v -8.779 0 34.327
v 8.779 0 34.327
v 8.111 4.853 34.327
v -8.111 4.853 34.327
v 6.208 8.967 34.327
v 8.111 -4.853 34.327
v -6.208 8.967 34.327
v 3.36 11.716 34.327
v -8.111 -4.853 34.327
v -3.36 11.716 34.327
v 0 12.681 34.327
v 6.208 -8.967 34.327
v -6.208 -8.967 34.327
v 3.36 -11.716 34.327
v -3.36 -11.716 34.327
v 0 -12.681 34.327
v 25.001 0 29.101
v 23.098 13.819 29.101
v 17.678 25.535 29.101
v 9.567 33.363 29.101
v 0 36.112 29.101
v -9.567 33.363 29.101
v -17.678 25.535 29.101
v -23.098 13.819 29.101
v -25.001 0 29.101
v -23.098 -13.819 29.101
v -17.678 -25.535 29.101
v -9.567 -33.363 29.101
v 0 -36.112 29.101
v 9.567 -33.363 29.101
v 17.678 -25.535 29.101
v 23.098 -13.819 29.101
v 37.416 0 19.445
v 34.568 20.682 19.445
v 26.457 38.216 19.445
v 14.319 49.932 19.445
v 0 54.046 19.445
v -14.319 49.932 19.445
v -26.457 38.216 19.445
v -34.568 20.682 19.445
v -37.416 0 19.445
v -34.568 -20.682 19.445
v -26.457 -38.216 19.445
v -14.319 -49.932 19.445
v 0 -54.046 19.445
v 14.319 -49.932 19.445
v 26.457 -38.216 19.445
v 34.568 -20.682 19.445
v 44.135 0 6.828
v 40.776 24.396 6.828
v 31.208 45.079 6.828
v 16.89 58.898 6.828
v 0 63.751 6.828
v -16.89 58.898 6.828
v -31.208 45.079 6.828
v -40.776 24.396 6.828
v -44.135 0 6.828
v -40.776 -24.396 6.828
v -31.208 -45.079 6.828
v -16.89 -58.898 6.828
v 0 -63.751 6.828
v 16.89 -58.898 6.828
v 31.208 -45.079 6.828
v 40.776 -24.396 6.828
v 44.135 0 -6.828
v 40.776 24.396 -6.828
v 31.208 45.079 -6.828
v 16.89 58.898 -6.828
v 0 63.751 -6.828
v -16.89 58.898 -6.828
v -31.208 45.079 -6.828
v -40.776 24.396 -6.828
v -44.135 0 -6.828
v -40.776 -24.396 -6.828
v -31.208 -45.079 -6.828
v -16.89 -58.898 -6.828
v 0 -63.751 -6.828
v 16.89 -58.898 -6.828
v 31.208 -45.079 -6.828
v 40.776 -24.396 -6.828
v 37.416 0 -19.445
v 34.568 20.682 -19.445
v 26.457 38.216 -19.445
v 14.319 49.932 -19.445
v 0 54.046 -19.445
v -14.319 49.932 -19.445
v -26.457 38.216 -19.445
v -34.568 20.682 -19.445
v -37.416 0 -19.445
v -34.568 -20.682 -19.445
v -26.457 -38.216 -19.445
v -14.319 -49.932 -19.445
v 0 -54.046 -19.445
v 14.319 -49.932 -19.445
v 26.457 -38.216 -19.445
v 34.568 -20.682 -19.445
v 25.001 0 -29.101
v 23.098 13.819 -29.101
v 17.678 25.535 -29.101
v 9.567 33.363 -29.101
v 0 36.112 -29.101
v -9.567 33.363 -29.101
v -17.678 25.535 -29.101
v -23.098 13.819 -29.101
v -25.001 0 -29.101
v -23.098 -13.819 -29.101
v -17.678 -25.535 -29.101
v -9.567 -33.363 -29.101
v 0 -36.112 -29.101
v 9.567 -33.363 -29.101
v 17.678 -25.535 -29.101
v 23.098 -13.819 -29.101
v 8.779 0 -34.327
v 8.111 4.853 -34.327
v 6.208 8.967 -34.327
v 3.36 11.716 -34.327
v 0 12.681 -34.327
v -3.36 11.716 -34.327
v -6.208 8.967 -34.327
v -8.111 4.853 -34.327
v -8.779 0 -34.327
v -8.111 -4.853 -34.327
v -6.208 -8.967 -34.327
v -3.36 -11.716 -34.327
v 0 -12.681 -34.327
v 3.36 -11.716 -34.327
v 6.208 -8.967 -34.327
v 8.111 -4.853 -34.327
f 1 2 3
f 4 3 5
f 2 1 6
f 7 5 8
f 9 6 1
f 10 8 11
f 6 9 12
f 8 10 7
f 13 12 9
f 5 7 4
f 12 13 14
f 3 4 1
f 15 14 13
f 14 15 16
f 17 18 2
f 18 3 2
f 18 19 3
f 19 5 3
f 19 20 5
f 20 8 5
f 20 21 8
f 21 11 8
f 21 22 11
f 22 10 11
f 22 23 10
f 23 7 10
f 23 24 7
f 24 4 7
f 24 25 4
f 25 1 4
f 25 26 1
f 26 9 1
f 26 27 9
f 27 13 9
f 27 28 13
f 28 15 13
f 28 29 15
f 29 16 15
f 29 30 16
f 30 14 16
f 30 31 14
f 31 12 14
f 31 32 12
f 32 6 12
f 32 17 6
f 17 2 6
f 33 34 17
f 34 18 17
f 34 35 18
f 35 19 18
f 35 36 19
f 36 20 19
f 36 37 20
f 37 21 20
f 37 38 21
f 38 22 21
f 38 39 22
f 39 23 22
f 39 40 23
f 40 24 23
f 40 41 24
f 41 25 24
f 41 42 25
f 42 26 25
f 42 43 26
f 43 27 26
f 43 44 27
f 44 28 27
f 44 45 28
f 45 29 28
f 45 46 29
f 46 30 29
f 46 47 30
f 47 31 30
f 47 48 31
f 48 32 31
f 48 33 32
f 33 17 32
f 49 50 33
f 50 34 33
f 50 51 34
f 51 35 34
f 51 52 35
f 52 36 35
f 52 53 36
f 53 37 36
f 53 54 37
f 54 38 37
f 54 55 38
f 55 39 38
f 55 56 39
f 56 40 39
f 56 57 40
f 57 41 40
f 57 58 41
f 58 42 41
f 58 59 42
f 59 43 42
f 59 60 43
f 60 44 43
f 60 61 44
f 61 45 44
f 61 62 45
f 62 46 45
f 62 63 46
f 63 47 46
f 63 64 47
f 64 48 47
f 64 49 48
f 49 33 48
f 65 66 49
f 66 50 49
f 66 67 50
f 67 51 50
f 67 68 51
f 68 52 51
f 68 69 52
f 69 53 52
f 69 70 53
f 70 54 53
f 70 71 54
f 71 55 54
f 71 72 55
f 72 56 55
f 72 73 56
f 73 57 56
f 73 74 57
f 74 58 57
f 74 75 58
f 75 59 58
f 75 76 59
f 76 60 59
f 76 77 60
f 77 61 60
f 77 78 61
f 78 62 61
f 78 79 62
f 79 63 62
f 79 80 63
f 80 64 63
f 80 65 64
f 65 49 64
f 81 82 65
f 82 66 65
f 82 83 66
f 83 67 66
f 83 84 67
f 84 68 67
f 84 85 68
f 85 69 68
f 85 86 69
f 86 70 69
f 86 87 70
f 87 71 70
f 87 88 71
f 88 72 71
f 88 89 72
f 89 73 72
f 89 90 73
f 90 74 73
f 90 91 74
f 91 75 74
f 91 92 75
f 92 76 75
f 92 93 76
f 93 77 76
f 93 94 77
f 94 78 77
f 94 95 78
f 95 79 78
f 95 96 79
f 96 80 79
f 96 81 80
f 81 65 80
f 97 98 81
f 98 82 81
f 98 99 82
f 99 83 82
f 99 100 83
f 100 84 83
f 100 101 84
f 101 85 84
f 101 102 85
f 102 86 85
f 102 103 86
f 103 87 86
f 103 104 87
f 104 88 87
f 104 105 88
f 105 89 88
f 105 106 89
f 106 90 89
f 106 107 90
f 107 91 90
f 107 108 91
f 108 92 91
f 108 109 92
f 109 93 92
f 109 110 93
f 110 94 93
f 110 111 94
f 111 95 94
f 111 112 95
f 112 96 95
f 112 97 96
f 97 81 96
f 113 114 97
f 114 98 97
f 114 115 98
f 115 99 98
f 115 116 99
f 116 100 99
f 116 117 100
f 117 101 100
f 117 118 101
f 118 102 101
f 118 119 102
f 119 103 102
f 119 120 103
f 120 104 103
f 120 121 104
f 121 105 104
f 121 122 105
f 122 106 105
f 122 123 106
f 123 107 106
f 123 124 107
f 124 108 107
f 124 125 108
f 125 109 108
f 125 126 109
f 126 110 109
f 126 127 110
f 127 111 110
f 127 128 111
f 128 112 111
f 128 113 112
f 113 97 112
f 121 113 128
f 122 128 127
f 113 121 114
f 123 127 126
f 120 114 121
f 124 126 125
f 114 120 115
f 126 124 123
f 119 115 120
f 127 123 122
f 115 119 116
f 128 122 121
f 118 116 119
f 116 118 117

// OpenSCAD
// Generated by SolidPython 1.0.1 on 2020-07-29 00:46:48


scale(v = [9, 13, 7]) {
	sphere(r = 5);
}
/***********************************************
*********      SolidPython code:      **********
************************************************
 
# import packages: SolidPython
from solid import *
from solid.utils import *
from itertools import chain, combinations, permutations


class Resize:

    def __init__(self, scad_file):
        self.scad_file = scad_file
        #self.scad_file = import_scad(scad_file)
        # cone/cylinder param:
        self.r1 = 0
        self.r2 = 0
        self.h = 0
        # rectangular prism param:
        self.w = 0
        self.l = 0
        # ellipse param:
        self.r = 0

    # import OpenScad code (file name corresponds to shape)


    # classify shape + parameters
    def assign(self, param1, param2, param3):
        if self.scad_file == 'cone.scad':
            self.r1 = param1
            self.r2 = param2
            self.h = param3
        elif self.scad_file == 'cylinder.scad':
            self.r1 = param1
            self.r2 = param2
            self.h = param3
        elif self.scad_file == 'rectangularPrism.scad':
            self.h = param1
            self.l = param2
            self.w = param3
        else:
            self.r = param1
            self.h = param2

    # resize parameters
    def iterate(self):
        x = range(3, 20, 2)
        i = 1
        if self.scad_file == 'cone.scad':
            tempList = list(permutations(x, 2))
            for temp in tempList:
                param1 = temp[0]
                param2 = temp[1]
                filepath = 'produced_scad_files/' + 'cone' + str(param1) + '_' + str(param2) + '_' + '.scad'
                scad_render_to_file(cylinder(h=param1, r1=param2, r2=0), filepath)

        elif self.scad_file == 'cylinder.scad':
            tempList = list(permutations(x, 3))
            for temp in tempList:
                param1 = temp[0]
                param2 = temp[1]
                filepath = 'produced_scad_files/' + 'cylinder' + str(param1) + '_' + str(param2) + '_' + '.scad'
                scad_render_to_file(cylinder(h=param1, r1=param2, r2=param2), filepath)

        elif self.scad_file == 'rectangularPrism.scad':
            tempList = list(permutations(x, 3))
            for temp in tempList:
                param1 = temp[0]
                param2 = temp[1]
                param3 = temp[2]
                filepath = 'produced_scad_files/' + 'rectangularPrism' + str(param1) + '_' + str(param2) + '_' + str(
                    param3) + '.scad'
                scad_render_to_file(cube(size=(param1, param2, param3)), filepath)

        elif self.scad_file == 'ellipse.scad':
            tempList = list(permutations(x, 4))
            for temp in tempList:
                param1 = temp[0]
                param2 = temp[1]
                param3 = temp[2]
                param4 = temp[3]
                filepath = 'produced_scad_files/' + 'ellipse' + str(param1) + '_' + str(param2) + '_' + str(param3) + '_' + str(param4) + '.scad'
                scad_render_to_file(scale([param1, param2, param3])(sphere(r=param4)), filepath)

    def render_to_scadfile(self):
        scad_render_to_file(scad, 'example.scad') 
 
************************************************/
